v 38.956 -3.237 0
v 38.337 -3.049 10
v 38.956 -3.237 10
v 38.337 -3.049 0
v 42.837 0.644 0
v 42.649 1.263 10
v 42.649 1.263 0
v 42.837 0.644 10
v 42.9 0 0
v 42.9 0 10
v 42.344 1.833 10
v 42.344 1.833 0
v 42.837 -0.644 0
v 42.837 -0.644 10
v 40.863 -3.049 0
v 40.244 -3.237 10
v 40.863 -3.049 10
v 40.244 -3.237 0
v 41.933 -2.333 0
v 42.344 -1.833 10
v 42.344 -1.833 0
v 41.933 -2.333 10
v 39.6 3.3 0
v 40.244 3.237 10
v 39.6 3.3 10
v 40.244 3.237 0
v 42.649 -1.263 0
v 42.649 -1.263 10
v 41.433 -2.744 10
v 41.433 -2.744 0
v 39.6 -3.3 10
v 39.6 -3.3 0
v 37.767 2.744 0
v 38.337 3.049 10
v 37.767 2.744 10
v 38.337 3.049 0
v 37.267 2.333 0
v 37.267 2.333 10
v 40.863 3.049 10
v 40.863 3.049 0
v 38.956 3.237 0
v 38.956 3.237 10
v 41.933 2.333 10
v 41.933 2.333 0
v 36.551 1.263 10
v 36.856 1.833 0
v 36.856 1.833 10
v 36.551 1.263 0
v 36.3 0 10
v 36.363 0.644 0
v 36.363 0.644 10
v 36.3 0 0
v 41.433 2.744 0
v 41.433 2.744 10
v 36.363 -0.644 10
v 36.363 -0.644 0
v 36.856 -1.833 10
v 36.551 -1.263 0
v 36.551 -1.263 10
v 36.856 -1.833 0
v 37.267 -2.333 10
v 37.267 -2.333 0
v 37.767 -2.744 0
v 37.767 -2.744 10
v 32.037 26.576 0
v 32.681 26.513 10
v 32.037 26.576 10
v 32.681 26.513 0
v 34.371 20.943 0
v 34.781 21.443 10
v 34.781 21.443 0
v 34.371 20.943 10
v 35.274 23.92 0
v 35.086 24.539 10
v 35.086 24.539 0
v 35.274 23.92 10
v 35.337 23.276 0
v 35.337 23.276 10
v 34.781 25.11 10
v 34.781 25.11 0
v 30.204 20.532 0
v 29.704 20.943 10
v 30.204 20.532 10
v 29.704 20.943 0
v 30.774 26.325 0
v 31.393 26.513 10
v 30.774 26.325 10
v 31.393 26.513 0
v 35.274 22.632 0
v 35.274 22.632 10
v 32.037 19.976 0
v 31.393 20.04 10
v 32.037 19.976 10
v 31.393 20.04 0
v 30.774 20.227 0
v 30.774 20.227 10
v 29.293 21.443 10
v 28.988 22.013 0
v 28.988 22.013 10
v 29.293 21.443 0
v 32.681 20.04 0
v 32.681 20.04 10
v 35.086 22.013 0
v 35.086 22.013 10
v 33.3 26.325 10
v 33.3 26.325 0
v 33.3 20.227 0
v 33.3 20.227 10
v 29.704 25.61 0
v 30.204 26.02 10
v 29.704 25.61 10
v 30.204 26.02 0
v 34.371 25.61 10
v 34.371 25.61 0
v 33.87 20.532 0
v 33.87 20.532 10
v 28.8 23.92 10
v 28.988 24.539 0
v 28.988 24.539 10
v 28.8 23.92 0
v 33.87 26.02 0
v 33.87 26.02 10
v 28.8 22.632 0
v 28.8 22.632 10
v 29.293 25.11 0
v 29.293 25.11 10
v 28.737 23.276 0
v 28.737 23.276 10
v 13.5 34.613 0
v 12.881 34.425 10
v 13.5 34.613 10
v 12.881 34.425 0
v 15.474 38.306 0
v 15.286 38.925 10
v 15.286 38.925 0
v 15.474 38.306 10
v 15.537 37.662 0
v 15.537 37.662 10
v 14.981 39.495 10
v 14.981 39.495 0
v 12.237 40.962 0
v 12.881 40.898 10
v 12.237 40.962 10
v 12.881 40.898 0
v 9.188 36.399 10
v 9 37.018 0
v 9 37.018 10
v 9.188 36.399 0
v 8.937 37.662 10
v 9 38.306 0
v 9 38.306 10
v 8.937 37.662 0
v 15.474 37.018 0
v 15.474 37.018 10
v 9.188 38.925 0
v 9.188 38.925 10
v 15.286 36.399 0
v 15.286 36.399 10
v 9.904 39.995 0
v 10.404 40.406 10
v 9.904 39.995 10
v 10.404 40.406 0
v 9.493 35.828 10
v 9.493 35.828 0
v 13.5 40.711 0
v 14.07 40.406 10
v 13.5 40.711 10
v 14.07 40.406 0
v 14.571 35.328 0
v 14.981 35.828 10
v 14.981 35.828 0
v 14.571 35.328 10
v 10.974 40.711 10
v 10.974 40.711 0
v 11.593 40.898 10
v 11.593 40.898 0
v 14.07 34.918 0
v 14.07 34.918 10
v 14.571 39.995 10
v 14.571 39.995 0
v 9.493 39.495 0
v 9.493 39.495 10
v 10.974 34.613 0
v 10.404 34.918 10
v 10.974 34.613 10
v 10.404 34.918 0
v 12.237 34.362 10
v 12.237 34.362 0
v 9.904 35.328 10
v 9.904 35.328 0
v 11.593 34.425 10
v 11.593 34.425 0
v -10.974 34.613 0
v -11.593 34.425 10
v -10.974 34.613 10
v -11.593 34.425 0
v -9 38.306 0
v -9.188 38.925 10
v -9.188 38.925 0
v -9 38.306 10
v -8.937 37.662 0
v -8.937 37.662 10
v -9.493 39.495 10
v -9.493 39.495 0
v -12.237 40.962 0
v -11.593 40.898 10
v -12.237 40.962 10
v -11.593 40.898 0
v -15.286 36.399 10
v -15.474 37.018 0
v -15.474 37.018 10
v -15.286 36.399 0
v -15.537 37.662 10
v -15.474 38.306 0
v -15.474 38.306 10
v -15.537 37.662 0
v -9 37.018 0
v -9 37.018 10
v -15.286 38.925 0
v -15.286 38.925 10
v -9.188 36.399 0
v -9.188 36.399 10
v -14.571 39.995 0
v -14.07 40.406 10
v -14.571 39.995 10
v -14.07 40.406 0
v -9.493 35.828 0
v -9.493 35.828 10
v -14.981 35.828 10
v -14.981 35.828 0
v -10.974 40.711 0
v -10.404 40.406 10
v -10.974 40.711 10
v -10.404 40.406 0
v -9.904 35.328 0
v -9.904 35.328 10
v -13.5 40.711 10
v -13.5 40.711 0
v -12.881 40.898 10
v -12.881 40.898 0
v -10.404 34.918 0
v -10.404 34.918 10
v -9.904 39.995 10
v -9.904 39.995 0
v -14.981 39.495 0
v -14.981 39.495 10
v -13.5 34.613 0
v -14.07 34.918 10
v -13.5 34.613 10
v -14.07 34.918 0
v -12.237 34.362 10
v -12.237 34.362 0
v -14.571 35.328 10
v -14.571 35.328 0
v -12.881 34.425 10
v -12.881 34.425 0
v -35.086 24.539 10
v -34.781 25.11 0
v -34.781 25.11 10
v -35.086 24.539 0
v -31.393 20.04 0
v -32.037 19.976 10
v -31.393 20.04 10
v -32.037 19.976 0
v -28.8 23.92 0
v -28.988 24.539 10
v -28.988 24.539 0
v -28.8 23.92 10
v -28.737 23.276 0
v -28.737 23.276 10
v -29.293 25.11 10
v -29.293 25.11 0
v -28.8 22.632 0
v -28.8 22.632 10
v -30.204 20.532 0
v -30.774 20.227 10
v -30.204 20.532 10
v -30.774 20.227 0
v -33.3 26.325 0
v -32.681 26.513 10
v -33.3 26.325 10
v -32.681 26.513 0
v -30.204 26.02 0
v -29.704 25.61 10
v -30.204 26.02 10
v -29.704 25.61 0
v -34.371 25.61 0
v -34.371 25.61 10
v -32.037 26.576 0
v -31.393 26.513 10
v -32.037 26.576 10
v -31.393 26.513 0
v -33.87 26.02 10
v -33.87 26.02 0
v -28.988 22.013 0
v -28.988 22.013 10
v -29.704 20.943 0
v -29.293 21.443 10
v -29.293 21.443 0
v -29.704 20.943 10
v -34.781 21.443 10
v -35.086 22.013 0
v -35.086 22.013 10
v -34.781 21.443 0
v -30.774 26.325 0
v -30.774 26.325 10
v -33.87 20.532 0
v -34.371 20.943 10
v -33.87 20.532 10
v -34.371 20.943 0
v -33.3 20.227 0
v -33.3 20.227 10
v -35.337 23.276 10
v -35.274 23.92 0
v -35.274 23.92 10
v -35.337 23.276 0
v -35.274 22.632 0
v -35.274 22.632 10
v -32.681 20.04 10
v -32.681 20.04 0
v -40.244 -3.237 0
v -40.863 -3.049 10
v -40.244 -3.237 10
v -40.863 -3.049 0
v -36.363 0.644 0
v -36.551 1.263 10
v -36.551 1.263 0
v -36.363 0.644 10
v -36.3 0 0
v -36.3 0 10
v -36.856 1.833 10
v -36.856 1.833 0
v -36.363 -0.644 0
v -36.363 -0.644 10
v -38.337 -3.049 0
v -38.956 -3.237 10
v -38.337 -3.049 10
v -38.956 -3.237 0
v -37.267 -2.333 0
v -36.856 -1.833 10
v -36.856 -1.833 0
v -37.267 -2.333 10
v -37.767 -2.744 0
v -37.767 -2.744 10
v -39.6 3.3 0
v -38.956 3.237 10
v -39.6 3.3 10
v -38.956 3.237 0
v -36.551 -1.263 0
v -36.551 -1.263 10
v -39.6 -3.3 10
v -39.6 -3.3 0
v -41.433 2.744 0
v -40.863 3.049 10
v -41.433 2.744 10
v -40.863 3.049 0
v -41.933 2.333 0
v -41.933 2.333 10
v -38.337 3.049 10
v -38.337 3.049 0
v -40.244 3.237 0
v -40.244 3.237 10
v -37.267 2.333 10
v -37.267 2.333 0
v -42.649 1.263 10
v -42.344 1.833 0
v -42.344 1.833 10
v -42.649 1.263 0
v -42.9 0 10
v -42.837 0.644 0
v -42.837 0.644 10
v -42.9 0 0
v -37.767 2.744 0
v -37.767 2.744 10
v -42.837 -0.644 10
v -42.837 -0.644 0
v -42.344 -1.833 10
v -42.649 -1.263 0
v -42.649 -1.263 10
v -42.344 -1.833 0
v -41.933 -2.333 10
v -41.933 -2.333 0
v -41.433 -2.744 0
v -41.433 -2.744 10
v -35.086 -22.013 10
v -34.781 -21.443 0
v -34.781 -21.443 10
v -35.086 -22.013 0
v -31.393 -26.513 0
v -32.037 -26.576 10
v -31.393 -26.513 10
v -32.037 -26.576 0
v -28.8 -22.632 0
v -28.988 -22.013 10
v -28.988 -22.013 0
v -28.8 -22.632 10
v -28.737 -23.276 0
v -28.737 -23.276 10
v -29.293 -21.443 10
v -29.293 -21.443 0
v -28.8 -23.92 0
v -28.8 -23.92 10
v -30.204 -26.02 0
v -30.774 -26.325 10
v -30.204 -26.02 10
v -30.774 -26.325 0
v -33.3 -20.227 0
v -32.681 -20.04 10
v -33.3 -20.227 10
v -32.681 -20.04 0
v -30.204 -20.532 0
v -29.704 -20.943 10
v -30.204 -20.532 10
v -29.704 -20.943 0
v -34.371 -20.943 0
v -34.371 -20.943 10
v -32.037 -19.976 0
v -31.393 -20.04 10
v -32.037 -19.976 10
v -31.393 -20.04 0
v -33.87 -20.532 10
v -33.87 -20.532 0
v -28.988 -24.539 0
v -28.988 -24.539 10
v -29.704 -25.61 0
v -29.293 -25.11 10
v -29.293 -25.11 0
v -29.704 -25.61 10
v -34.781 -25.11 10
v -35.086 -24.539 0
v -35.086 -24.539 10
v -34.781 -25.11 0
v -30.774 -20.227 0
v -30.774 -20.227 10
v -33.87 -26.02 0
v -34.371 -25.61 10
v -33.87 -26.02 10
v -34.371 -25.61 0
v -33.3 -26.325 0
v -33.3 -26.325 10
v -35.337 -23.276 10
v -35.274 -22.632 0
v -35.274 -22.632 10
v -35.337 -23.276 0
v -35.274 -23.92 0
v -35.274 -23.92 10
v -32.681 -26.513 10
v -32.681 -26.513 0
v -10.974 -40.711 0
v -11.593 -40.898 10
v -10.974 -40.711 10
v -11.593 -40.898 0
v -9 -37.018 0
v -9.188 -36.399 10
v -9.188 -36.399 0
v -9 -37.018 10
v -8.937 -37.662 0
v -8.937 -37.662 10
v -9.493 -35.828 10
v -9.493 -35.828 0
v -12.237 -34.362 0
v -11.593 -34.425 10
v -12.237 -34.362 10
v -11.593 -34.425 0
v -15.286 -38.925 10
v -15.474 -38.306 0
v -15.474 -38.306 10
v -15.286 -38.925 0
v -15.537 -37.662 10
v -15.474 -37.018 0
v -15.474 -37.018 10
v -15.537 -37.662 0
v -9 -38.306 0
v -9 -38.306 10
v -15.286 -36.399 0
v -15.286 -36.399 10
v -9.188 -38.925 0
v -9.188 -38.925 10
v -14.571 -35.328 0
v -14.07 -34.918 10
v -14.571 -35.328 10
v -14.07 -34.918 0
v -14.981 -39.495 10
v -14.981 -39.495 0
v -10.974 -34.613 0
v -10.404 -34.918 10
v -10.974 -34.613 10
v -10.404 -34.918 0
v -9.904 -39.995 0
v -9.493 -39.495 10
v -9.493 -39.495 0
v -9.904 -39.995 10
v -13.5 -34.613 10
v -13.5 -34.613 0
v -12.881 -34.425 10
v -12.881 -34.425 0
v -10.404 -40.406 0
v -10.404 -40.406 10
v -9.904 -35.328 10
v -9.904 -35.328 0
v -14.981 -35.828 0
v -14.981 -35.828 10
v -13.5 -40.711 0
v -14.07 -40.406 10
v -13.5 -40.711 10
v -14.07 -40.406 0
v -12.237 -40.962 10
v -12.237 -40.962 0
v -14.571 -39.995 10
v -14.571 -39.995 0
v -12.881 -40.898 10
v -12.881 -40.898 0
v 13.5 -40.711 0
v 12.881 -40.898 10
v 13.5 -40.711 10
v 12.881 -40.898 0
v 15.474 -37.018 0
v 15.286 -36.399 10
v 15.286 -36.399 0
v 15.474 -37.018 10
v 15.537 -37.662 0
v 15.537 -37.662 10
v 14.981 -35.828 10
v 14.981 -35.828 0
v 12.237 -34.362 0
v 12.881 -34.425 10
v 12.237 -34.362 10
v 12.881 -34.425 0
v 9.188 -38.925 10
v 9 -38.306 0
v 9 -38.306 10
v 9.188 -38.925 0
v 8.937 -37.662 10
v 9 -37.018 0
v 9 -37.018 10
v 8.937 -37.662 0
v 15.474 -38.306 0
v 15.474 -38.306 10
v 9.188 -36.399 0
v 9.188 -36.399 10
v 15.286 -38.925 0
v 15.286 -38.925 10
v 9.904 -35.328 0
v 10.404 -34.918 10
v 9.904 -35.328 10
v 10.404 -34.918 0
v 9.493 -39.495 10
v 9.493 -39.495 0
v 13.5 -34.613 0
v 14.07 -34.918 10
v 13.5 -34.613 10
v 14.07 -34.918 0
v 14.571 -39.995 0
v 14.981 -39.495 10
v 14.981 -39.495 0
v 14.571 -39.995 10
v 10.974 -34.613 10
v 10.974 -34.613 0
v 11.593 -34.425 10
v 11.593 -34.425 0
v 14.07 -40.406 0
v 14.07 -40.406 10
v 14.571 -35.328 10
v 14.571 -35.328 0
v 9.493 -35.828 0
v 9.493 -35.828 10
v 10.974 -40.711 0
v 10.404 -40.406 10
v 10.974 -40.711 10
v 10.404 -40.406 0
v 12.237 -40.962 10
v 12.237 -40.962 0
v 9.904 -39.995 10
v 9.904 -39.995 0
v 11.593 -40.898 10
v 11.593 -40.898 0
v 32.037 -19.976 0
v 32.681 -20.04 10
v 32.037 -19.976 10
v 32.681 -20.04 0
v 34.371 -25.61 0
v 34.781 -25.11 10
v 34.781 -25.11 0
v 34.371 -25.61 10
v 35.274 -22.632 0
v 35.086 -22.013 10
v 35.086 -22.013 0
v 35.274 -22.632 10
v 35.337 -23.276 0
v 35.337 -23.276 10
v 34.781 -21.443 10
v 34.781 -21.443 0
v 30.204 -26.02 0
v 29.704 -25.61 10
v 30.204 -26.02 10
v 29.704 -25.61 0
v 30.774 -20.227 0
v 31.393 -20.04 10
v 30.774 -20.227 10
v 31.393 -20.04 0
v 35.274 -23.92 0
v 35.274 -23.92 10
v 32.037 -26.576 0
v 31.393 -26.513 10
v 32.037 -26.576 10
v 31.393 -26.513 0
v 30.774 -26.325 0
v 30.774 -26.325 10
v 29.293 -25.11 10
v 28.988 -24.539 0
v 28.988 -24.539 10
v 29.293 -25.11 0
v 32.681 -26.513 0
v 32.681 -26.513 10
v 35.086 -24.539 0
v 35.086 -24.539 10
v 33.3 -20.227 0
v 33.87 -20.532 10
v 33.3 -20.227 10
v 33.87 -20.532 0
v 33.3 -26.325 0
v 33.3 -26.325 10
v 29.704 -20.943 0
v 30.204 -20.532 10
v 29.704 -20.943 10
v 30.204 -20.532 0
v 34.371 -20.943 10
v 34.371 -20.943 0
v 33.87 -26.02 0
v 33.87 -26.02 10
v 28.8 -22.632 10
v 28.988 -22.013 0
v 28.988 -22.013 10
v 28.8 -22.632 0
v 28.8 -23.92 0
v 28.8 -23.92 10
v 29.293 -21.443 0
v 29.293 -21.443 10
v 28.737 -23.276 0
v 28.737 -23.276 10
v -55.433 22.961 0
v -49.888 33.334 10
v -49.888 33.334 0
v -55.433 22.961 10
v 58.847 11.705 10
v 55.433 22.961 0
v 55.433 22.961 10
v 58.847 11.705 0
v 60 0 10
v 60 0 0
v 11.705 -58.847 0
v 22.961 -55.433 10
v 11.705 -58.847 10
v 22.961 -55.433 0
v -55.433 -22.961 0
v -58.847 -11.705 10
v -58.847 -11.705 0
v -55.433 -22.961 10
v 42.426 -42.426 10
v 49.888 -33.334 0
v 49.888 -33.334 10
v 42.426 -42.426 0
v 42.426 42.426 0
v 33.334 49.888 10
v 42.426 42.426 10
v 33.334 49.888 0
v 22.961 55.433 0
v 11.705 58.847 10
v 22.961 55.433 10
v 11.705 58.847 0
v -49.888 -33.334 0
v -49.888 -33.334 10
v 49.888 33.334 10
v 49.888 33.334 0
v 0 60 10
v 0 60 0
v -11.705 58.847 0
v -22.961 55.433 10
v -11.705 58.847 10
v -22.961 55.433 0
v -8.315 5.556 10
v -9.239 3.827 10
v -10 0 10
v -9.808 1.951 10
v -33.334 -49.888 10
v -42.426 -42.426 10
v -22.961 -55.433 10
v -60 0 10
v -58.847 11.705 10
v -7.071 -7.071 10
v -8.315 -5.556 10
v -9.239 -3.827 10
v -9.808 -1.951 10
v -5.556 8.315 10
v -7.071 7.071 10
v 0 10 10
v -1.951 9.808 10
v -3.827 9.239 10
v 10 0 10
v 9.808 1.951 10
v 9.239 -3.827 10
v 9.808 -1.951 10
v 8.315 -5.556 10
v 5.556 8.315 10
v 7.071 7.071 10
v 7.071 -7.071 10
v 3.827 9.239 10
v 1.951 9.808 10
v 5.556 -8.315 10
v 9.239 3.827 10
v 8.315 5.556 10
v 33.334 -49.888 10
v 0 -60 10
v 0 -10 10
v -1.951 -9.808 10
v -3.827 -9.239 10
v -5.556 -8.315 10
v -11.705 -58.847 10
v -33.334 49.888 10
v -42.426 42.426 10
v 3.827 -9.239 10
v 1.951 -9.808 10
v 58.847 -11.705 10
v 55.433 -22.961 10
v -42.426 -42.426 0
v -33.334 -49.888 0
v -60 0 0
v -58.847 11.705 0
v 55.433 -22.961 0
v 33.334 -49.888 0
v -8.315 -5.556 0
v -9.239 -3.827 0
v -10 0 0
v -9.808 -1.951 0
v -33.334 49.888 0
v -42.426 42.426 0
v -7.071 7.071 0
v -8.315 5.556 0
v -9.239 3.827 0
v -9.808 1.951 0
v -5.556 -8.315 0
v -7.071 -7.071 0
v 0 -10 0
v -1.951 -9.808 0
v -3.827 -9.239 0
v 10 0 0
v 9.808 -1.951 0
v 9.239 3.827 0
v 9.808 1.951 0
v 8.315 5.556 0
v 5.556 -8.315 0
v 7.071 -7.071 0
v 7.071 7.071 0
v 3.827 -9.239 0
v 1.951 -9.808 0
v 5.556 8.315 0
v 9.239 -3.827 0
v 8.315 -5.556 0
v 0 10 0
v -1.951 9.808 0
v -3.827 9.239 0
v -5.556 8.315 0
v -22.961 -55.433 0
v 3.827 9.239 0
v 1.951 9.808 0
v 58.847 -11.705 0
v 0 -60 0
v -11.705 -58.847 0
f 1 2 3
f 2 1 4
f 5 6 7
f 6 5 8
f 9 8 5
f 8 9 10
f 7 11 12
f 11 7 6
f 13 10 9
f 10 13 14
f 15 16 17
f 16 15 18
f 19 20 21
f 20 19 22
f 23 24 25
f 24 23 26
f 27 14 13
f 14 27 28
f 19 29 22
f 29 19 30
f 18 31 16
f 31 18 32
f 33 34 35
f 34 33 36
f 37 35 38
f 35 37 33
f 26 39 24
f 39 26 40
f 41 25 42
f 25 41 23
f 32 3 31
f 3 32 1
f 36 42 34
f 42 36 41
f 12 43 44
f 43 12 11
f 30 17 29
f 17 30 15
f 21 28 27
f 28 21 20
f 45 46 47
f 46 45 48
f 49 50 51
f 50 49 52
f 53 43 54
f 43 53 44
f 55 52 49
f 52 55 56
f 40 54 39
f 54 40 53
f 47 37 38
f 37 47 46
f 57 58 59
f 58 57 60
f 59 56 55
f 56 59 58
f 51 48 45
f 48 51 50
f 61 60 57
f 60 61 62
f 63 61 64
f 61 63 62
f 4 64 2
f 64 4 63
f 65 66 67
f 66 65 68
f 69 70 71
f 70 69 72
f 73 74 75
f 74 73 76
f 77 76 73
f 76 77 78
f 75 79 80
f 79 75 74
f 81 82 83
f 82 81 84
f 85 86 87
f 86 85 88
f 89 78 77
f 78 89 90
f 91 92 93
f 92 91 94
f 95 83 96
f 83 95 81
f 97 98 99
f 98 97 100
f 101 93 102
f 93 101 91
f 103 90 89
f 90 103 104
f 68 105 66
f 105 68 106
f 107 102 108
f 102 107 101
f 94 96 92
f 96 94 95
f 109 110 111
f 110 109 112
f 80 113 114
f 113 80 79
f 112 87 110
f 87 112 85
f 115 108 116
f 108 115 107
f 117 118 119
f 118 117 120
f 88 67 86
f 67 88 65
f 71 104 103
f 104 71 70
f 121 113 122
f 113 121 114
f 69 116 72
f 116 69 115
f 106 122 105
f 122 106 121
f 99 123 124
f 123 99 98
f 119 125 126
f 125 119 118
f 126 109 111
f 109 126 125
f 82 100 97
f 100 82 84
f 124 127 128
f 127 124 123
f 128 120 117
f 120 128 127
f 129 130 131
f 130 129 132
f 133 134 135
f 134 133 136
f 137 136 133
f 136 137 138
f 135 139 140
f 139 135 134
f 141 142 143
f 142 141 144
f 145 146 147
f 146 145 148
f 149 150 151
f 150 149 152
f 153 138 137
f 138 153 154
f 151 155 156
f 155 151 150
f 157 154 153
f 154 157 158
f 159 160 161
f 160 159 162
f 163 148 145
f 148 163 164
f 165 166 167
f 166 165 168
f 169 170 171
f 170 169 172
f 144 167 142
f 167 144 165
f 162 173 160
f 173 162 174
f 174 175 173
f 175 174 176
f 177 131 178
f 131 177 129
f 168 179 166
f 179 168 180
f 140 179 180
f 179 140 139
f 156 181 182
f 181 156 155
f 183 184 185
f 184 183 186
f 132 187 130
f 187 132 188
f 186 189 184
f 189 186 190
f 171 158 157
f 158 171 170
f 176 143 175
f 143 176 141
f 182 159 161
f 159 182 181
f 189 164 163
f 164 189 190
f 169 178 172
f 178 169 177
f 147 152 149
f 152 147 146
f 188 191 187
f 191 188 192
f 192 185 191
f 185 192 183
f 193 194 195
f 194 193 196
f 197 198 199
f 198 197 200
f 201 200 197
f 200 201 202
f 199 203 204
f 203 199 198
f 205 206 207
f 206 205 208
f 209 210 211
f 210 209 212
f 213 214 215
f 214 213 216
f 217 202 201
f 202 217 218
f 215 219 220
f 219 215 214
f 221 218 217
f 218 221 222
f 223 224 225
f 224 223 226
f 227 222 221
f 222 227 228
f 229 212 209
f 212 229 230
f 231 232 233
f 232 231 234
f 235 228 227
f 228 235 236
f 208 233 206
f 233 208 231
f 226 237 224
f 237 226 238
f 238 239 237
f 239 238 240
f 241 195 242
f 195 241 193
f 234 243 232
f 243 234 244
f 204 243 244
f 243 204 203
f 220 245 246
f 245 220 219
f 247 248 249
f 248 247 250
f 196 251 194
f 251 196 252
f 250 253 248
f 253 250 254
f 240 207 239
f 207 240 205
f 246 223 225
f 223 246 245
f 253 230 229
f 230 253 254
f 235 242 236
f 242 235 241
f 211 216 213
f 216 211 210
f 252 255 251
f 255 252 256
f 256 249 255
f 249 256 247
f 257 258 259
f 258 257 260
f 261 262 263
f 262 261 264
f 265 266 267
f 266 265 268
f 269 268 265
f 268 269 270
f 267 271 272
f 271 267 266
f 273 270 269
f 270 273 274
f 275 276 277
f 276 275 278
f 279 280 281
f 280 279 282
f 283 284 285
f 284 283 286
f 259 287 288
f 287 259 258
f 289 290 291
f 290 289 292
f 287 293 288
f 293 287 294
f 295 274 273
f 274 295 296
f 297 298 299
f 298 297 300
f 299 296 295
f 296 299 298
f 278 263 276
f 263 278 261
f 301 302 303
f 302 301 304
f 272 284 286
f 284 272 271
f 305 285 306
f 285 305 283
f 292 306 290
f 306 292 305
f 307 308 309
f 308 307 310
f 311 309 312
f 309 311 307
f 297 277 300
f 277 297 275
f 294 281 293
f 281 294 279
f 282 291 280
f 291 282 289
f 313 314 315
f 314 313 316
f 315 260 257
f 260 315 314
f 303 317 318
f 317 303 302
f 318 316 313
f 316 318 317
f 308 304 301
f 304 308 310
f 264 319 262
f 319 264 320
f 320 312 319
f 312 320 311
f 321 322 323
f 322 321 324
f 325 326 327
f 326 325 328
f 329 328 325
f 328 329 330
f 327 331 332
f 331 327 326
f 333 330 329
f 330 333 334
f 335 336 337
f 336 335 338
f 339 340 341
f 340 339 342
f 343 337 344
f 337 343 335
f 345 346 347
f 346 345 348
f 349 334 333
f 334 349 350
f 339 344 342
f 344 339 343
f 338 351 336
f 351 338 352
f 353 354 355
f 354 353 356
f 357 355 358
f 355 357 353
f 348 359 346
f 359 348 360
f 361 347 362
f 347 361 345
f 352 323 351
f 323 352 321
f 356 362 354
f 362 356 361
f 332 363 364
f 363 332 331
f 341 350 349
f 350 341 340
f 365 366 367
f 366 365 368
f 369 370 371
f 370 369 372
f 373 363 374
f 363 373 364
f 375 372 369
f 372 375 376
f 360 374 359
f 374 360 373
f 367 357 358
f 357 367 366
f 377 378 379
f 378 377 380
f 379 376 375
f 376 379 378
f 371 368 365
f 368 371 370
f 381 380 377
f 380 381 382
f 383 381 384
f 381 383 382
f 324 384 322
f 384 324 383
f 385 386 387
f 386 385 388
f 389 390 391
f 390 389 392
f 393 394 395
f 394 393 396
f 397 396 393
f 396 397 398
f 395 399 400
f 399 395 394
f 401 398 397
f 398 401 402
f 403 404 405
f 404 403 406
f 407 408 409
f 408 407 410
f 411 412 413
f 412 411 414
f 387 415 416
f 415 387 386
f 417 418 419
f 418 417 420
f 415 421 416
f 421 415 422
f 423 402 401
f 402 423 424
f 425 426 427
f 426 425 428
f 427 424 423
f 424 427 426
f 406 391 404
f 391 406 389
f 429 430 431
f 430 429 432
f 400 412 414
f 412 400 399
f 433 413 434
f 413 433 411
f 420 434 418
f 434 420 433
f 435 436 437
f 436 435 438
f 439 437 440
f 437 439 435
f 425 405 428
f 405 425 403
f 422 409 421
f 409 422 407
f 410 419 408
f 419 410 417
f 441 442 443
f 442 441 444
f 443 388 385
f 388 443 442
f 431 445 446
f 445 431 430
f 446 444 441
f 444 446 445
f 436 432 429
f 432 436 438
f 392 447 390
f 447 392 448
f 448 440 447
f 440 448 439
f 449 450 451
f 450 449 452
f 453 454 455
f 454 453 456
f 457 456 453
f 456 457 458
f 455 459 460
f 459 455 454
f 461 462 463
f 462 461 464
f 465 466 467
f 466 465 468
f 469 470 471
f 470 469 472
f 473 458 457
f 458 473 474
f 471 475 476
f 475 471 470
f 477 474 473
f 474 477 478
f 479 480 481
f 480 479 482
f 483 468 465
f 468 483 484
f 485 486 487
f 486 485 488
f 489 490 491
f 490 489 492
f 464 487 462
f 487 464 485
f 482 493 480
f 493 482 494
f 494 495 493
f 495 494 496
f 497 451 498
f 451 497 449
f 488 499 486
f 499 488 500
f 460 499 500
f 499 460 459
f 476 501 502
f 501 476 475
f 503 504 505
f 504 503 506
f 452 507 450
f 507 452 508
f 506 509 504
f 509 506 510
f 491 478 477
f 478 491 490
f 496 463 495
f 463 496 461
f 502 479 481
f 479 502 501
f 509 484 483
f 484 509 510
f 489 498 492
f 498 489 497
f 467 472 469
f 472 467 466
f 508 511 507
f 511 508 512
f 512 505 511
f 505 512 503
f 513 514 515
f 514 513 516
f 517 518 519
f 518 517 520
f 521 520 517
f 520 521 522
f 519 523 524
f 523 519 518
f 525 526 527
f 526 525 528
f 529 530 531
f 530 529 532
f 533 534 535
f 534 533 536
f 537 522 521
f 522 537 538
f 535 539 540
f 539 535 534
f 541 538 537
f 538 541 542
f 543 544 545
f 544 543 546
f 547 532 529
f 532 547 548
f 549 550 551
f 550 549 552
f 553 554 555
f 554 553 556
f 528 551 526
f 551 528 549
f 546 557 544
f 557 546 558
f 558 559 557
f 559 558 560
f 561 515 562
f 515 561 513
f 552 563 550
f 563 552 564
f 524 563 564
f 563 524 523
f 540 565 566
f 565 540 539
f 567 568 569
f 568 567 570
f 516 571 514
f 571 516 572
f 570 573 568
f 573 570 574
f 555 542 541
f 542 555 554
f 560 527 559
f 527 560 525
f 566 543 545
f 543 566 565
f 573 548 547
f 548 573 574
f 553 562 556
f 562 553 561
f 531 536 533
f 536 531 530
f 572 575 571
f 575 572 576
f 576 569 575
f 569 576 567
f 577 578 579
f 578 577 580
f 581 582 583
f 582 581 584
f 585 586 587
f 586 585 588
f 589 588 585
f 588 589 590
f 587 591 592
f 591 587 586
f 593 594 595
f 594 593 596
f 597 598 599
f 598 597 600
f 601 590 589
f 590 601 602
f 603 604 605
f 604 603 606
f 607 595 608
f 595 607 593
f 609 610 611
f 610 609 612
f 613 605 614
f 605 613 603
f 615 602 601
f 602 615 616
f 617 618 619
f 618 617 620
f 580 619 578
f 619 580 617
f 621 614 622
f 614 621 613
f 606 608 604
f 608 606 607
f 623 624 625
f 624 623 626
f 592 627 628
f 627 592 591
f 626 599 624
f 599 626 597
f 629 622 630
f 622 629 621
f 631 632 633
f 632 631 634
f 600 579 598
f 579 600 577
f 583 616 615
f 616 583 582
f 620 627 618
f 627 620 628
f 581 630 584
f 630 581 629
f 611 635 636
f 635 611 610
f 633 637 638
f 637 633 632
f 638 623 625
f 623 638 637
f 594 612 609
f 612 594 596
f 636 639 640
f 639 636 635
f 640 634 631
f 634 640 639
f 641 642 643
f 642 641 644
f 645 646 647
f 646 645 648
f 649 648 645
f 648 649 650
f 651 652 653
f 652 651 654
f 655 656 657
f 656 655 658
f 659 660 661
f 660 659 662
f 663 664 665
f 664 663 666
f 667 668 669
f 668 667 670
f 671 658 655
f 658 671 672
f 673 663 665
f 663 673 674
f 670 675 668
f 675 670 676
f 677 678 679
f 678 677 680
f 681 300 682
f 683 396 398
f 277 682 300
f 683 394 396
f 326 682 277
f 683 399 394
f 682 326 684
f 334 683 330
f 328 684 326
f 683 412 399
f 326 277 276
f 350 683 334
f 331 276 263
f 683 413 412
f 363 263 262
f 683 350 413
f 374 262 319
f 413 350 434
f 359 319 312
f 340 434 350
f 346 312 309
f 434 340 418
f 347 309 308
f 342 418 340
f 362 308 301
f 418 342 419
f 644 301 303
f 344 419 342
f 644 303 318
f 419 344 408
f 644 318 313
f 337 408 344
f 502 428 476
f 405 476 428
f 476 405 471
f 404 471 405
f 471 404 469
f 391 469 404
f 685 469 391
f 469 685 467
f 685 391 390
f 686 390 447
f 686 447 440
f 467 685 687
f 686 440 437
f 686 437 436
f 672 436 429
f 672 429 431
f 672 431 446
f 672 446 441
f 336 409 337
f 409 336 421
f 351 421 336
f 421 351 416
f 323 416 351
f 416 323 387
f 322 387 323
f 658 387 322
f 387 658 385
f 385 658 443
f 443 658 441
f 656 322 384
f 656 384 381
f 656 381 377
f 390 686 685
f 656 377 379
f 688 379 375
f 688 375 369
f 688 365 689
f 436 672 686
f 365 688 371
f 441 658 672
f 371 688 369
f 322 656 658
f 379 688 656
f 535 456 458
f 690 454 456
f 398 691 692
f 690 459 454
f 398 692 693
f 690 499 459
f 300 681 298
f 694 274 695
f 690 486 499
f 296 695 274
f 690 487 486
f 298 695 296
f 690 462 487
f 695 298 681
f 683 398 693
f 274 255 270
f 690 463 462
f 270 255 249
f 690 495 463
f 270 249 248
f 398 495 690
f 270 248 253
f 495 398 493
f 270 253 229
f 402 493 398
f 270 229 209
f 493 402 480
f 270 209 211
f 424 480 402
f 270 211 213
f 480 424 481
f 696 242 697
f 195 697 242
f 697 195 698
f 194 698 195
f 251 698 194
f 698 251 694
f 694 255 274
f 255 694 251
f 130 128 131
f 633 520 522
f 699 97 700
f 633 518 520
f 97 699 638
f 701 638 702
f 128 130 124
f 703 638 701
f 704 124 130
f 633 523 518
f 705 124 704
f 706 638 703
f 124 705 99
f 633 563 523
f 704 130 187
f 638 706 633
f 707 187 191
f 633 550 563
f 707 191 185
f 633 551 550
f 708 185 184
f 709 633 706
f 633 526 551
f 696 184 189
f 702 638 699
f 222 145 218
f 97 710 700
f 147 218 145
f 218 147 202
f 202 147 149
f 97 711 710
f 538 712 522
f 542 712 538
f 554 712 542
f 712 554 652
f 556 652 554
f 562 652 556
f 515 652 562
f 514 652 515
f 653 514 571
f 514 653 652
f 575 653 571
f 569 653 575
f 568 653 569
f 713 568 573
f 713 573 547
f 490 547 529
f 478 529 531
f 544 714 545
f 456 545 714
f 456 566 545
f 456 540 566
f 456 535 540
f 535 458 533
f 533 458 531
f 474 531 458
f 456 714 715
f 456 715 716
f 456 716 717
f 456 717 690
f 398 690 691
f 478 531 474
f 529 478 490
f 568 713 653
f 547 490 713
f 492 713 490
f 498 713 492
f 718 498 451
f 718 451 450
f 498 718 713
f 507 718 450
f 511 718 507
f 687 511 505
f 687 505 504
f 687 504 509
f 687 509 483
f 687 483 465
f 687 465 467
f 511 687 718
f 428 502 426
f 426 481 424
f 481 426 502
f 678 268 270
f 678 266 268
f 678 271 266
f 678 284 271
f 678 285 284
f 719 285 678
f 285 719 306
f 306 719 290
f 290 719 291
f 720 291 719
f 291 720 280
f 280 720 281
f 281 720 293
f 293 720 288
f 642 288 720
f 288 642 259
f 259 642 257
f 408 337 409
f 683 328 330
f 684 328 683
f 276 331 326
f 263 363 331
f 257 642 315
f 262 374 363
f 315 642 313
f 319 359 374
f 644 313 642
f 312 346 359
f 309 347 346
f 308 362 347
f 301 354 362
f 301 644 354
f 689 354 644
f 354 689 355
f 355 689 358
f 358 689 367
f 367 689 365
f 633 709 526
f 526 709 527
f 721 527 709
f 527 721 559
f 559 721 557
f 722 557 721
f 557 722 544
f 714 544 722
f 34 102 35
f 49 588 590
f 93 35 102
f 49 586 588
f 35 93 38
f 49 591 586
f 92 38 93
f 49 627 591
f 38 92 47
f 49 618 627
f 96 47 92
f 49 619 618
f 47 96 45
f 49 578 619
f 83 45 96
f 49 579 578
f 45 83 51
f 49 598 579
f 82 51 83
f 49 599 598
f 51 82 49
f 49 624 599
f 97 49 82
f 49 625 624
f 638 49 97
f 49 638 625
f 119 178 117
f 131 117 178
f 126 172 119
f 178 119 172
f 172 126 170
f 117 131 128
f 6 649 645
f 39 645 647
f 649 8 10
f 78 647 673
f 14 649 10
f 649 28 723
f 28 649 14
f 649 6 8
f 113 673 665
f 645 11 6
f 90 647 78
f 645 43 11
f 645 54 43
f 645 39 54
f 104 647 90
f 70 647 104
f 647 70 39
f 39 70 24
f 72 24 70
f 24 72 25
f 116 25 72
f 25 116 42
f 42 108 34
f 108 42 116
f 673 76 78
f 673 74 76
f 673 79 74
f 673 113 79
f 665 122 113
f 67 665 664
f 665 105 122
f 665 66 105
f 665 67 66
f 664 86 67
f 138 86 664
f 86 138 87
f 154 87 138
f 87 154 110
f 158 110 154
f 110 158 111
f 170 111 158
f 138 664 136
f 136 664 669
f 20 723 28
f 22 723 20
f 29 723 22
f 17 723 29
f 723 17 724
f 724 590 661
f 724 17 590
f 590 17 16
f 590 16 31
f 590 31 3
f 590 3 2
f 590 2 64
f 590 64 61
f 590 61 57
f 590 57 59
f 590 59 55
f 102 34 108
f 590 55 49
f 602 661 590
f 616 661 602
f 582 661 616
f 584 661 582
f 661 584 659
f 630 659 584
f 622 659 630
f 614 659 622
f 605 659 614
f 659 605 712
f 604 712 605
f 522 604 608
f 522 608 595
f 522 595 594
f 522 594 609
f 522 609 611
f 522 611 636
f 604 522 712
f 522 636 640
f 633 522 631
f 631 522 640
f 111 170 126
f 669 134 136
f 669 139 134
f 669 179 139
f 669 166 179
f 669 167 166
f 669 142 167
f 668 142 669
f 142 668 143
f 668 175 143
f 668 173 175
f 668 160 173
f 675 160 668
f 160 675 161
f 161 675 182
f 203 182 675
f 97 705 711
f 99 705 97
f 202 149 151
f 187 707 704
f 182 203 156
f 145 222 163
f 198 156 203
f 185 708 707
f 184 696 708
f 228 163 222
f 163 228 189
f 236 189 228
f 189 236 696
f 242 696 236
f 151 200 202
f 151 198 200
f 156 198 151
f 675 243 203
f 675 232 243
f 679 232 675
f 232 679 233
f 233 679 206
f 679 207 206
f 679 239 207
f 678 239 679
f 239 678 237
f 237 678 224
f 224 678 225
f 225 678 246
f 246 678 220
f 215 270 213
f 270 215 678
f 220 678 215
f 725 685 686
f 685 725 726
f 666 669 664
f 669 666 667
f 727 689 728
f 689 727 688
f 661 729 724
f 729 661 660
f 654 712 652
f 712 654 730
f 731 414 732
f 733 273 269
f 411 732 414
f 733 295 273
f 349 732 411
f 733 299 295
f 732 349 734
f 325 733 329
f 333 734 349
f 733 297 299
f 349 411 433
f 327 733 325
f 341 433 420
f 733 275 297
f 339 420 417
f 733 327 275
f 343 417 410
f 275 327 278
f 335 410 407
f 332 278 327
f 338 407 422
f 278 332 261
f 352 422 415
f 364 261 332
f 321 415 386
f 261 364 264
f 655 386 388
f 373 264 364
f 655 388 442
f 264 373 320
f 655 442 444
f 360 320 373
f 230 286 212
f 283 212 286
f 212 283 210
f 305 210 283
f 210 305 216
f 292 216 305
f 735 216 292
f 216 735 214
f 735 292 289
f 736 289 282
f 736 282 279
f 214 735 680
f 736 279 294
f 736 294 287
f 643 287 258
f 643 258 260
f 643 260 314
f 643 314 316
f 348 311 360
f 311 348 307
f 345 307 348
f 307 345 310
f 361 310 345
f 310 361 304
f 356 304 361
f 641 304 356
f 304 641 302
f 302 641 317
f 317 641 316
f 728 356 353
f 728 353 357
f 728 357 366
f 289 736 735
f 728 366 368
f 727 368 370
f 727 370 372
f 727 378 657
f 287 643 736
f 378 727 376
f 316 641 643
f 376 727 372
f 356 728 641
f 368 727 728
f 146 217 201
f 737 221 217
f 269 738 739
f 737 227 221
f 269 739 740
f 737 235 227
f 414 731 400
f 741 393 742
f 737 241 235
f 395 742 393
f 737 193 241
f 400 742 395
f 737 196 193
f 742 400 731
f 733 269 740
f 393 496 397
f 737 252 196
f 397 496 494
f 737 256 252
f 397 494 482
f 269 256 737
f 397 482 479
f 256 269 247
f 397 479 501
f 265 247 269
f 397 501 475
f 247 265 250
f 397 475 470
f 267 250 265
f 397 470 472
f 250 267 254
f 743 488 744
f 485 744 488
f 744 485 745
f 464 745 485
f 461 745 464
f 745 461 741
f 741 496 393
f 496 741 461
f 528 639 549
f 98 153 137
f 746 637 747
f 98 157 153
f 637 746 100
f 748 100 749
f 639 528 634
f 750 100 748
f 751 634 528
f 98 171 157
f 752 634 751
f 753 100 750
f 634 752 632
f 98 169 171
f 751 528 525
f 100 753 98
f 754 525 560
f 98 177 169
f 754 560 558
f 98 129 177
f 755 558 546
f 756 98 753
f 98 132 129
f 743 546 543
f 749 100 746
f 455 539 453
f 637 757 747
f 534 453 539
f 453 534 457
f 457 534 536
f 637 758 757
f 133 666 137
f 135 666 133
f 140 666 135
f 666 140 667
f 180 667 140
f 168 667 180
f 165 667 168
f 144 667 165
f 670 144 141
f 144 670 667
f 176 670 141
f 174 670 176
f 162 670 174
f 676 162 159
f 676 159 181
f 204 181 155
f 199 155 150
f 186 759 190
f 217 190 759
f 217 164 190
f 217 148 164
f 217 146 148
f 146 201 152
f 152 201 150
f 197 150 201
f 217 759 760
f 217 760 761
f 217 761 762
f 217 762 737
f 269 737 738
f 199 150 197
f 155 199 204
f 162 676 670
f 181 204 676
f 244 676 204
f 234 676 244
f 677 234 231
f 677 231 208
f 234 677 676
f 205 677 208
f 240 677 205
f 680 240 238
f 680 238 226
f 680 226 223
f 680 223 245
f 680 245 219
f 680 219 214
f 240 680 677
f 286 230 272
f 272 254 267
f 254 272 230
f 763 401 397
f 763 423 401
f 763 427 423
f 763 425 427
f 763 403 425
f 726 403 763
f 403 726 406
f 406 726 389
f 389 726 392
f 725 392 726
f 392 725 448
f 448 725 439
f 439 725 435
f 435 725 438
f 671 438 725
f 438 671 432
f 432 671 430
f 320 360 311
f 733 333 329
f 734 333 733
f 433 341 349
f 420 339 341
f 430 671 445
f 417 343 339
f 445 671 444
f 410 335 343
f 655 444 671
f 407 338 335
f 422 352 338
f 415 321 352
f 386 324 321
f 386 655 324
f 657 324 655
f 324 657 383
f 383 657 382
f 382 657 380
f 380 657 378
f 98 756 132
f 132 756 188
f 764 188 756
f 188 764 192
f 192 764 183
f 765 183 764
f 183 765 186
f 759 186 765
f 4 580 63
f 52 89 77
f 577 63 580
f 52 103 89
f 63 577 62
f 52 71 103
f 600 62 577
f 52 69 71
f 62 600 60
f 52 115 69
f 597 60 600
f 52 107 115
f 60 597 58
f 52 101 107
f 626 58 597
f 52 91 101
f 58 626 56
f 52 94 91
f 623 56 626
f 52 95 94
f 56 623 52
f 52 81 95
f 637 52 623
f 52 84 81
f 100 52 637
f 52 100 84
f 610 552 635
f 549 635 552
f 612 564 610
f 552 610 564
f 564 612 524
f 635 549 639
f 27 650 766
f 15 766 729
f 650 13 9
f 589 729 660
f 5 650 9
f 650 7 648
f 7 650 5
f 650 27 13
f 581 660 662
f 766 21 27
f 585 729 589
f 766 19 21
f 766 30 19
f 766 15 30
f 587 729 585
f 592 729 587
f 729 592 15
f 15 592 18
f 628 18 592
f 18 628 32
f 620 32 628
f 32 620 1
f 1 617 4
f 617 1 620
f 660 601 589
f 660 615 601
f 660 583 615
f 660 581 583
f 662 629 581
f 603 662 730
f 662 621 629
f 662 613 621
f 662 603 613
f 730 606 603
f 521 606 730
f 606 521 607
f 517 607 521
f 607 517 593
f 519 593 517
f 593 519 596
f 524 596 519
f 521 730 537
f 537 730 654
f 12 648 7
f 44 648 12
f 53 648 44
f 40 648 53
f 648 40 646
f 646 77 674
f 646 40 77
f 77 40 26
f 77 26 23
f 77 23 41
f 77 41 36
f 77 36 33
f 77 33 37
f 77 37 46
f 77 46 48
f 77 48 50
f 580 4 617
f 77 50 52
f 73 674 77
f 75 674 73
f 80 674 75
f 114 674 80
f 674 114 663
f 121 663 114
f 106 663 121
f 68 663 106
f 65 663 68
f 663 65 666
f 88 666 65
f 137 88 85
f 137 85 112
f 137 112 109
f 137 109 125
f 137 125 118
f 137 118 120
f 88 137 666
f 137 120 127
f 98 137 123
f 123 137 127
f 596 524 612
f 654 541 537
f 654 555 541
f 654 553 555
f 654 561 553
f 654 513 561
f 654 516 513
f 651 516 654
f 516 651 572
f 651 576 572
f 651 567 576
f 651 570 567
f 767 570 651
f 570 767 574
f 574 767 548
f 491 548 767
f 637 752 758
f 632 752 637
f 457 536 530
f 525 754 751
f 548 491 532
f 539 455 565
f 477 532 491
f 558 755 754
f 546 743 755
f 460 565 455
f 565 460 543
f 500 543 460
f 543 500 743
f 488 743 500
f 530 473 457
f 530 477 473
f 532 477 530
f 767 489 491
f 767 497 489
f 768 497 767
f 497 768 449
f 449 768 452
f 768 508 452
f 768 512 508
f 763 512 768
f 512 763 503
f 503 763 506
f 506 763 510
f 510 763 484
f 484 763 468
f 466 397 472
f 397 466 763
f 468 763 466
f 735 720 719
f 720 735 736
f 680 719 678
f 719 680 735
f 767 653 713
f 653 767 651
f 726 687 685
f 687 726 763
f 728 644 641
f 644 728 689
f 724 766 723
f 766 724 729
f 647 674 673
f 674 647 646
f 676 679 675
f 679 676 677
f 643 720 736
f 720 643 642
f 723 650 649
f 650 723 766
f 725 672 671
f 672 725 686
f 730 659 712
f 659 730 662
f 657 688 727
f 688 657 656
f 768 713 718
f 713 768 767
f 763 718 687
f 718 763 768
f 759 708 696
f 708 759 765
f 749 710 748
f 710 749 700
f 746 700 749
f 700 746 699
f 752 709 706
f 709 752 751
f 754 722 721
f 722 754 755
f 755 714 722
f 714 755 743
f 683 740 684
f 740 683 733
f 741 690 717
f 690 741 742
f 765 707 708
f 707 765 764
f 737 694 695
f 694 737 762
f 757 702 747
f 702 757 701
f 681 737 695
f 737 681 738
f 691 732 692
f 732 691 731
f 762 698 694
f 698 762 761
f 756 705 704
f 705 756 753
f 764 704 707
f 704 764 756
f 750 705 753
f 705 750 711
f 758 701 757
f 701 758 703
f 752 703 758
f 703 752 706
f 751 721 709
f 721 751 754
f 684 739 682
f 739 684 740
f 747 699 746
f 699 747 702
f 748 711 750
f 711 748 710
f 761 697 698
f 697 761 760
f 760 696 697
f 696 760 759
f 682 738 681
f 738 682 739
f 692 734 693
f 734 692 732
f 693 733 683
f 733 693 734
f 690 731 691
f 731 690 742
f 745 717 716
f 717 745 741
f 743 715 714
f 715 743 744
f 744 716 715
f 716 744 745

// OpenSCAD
$fn = 32;

// ----------------------------------------------------------------------
// Flange Ø120 x 10
// 10 holes on a Ø79.2 bolt circle, bolted joints
// ----------------------------------------------------------------------

// --- parameters (mm) ---
flange_d = 120;  // outside diameter of the flange
thickness = 10;  // flange thickness
holes = 10;      // number of bolt holes
pcd = 79.2;      // bolt circle diameter
start_deg = 0;   // angle of the first hole, from +X
hole_d = 6.6;    // bolt hole diameter
bore_d = 20;     // central through bore
hub_d = 28;      // hub outside diameter
hub_h = 0;       // hub height above the flange face (0 = no hub)

// --- derived feature positions (mm) ---
height = thickness + hub_h;  // = 10   overall height of the part
pcd_r = pcd / 2;             // = 39.6   bolt circle radius
hole_step = 360 / holes;     // = 36   angular pitch
feature_centers = [
  [pcd_r * cos(start_deg + 0 * hole_step), pcd_r * sin(start_deg + 0 * hole_step)],
  [pcd_r * cos(start_deg + 1 * hole_step), pcd_r * sin(start_deg + 1 * hole_step)],
  [pcd_r * cos(start_deg + 2 * hole_step), pcd_r * sin(start_deg + 2 * hole_step)],
  [pcd_r * cos(start_deg + 3 * hole_step), pcd_r * sin(start_deg + 3 * hole_step)],
  [pcd_r * cos(start_deg + 4 * hole_step), pcd_r * sin(start_deg + 4 * hole_step)],
  [pcd_r * cos(start_deg + 5 * hole_step), pcd_r * sin(start_deg + 5 * hole_step)],
  [pcd_r * cos(start_deg + 6 * hole_step), pcd_r * sin(start_deg + 6 * hole_step)],
  [pcd_r * cos(start_deg + 7 * hole_step), pcd_r * sin(start_deg + 7 * hole_step)],
  [pcd_r * cos(start_deg + 8 * hole_step), pcd_r * sin(start_deg + 8 * hole_step)],
  [pcd_r * cos(start_deg + 9 * hole_step), pcd_r * sin(start_deg + 9 * hole_step)]
];   // bolt hole centres on the pitch circle

// flange disc, every hole and the bore cut straight through
difference() {
  union() {
    cylinder(d = flange_d, h = thickness);
  }
  translate([0, 0, -1]) cylinder(d = bore_d, h = height + 2);  // bore, through
  for (centre = feature_centers)
    translate([centre[0], centre[1], -1]) cylinder(d = hole_d, h = thickness + 2);
}
